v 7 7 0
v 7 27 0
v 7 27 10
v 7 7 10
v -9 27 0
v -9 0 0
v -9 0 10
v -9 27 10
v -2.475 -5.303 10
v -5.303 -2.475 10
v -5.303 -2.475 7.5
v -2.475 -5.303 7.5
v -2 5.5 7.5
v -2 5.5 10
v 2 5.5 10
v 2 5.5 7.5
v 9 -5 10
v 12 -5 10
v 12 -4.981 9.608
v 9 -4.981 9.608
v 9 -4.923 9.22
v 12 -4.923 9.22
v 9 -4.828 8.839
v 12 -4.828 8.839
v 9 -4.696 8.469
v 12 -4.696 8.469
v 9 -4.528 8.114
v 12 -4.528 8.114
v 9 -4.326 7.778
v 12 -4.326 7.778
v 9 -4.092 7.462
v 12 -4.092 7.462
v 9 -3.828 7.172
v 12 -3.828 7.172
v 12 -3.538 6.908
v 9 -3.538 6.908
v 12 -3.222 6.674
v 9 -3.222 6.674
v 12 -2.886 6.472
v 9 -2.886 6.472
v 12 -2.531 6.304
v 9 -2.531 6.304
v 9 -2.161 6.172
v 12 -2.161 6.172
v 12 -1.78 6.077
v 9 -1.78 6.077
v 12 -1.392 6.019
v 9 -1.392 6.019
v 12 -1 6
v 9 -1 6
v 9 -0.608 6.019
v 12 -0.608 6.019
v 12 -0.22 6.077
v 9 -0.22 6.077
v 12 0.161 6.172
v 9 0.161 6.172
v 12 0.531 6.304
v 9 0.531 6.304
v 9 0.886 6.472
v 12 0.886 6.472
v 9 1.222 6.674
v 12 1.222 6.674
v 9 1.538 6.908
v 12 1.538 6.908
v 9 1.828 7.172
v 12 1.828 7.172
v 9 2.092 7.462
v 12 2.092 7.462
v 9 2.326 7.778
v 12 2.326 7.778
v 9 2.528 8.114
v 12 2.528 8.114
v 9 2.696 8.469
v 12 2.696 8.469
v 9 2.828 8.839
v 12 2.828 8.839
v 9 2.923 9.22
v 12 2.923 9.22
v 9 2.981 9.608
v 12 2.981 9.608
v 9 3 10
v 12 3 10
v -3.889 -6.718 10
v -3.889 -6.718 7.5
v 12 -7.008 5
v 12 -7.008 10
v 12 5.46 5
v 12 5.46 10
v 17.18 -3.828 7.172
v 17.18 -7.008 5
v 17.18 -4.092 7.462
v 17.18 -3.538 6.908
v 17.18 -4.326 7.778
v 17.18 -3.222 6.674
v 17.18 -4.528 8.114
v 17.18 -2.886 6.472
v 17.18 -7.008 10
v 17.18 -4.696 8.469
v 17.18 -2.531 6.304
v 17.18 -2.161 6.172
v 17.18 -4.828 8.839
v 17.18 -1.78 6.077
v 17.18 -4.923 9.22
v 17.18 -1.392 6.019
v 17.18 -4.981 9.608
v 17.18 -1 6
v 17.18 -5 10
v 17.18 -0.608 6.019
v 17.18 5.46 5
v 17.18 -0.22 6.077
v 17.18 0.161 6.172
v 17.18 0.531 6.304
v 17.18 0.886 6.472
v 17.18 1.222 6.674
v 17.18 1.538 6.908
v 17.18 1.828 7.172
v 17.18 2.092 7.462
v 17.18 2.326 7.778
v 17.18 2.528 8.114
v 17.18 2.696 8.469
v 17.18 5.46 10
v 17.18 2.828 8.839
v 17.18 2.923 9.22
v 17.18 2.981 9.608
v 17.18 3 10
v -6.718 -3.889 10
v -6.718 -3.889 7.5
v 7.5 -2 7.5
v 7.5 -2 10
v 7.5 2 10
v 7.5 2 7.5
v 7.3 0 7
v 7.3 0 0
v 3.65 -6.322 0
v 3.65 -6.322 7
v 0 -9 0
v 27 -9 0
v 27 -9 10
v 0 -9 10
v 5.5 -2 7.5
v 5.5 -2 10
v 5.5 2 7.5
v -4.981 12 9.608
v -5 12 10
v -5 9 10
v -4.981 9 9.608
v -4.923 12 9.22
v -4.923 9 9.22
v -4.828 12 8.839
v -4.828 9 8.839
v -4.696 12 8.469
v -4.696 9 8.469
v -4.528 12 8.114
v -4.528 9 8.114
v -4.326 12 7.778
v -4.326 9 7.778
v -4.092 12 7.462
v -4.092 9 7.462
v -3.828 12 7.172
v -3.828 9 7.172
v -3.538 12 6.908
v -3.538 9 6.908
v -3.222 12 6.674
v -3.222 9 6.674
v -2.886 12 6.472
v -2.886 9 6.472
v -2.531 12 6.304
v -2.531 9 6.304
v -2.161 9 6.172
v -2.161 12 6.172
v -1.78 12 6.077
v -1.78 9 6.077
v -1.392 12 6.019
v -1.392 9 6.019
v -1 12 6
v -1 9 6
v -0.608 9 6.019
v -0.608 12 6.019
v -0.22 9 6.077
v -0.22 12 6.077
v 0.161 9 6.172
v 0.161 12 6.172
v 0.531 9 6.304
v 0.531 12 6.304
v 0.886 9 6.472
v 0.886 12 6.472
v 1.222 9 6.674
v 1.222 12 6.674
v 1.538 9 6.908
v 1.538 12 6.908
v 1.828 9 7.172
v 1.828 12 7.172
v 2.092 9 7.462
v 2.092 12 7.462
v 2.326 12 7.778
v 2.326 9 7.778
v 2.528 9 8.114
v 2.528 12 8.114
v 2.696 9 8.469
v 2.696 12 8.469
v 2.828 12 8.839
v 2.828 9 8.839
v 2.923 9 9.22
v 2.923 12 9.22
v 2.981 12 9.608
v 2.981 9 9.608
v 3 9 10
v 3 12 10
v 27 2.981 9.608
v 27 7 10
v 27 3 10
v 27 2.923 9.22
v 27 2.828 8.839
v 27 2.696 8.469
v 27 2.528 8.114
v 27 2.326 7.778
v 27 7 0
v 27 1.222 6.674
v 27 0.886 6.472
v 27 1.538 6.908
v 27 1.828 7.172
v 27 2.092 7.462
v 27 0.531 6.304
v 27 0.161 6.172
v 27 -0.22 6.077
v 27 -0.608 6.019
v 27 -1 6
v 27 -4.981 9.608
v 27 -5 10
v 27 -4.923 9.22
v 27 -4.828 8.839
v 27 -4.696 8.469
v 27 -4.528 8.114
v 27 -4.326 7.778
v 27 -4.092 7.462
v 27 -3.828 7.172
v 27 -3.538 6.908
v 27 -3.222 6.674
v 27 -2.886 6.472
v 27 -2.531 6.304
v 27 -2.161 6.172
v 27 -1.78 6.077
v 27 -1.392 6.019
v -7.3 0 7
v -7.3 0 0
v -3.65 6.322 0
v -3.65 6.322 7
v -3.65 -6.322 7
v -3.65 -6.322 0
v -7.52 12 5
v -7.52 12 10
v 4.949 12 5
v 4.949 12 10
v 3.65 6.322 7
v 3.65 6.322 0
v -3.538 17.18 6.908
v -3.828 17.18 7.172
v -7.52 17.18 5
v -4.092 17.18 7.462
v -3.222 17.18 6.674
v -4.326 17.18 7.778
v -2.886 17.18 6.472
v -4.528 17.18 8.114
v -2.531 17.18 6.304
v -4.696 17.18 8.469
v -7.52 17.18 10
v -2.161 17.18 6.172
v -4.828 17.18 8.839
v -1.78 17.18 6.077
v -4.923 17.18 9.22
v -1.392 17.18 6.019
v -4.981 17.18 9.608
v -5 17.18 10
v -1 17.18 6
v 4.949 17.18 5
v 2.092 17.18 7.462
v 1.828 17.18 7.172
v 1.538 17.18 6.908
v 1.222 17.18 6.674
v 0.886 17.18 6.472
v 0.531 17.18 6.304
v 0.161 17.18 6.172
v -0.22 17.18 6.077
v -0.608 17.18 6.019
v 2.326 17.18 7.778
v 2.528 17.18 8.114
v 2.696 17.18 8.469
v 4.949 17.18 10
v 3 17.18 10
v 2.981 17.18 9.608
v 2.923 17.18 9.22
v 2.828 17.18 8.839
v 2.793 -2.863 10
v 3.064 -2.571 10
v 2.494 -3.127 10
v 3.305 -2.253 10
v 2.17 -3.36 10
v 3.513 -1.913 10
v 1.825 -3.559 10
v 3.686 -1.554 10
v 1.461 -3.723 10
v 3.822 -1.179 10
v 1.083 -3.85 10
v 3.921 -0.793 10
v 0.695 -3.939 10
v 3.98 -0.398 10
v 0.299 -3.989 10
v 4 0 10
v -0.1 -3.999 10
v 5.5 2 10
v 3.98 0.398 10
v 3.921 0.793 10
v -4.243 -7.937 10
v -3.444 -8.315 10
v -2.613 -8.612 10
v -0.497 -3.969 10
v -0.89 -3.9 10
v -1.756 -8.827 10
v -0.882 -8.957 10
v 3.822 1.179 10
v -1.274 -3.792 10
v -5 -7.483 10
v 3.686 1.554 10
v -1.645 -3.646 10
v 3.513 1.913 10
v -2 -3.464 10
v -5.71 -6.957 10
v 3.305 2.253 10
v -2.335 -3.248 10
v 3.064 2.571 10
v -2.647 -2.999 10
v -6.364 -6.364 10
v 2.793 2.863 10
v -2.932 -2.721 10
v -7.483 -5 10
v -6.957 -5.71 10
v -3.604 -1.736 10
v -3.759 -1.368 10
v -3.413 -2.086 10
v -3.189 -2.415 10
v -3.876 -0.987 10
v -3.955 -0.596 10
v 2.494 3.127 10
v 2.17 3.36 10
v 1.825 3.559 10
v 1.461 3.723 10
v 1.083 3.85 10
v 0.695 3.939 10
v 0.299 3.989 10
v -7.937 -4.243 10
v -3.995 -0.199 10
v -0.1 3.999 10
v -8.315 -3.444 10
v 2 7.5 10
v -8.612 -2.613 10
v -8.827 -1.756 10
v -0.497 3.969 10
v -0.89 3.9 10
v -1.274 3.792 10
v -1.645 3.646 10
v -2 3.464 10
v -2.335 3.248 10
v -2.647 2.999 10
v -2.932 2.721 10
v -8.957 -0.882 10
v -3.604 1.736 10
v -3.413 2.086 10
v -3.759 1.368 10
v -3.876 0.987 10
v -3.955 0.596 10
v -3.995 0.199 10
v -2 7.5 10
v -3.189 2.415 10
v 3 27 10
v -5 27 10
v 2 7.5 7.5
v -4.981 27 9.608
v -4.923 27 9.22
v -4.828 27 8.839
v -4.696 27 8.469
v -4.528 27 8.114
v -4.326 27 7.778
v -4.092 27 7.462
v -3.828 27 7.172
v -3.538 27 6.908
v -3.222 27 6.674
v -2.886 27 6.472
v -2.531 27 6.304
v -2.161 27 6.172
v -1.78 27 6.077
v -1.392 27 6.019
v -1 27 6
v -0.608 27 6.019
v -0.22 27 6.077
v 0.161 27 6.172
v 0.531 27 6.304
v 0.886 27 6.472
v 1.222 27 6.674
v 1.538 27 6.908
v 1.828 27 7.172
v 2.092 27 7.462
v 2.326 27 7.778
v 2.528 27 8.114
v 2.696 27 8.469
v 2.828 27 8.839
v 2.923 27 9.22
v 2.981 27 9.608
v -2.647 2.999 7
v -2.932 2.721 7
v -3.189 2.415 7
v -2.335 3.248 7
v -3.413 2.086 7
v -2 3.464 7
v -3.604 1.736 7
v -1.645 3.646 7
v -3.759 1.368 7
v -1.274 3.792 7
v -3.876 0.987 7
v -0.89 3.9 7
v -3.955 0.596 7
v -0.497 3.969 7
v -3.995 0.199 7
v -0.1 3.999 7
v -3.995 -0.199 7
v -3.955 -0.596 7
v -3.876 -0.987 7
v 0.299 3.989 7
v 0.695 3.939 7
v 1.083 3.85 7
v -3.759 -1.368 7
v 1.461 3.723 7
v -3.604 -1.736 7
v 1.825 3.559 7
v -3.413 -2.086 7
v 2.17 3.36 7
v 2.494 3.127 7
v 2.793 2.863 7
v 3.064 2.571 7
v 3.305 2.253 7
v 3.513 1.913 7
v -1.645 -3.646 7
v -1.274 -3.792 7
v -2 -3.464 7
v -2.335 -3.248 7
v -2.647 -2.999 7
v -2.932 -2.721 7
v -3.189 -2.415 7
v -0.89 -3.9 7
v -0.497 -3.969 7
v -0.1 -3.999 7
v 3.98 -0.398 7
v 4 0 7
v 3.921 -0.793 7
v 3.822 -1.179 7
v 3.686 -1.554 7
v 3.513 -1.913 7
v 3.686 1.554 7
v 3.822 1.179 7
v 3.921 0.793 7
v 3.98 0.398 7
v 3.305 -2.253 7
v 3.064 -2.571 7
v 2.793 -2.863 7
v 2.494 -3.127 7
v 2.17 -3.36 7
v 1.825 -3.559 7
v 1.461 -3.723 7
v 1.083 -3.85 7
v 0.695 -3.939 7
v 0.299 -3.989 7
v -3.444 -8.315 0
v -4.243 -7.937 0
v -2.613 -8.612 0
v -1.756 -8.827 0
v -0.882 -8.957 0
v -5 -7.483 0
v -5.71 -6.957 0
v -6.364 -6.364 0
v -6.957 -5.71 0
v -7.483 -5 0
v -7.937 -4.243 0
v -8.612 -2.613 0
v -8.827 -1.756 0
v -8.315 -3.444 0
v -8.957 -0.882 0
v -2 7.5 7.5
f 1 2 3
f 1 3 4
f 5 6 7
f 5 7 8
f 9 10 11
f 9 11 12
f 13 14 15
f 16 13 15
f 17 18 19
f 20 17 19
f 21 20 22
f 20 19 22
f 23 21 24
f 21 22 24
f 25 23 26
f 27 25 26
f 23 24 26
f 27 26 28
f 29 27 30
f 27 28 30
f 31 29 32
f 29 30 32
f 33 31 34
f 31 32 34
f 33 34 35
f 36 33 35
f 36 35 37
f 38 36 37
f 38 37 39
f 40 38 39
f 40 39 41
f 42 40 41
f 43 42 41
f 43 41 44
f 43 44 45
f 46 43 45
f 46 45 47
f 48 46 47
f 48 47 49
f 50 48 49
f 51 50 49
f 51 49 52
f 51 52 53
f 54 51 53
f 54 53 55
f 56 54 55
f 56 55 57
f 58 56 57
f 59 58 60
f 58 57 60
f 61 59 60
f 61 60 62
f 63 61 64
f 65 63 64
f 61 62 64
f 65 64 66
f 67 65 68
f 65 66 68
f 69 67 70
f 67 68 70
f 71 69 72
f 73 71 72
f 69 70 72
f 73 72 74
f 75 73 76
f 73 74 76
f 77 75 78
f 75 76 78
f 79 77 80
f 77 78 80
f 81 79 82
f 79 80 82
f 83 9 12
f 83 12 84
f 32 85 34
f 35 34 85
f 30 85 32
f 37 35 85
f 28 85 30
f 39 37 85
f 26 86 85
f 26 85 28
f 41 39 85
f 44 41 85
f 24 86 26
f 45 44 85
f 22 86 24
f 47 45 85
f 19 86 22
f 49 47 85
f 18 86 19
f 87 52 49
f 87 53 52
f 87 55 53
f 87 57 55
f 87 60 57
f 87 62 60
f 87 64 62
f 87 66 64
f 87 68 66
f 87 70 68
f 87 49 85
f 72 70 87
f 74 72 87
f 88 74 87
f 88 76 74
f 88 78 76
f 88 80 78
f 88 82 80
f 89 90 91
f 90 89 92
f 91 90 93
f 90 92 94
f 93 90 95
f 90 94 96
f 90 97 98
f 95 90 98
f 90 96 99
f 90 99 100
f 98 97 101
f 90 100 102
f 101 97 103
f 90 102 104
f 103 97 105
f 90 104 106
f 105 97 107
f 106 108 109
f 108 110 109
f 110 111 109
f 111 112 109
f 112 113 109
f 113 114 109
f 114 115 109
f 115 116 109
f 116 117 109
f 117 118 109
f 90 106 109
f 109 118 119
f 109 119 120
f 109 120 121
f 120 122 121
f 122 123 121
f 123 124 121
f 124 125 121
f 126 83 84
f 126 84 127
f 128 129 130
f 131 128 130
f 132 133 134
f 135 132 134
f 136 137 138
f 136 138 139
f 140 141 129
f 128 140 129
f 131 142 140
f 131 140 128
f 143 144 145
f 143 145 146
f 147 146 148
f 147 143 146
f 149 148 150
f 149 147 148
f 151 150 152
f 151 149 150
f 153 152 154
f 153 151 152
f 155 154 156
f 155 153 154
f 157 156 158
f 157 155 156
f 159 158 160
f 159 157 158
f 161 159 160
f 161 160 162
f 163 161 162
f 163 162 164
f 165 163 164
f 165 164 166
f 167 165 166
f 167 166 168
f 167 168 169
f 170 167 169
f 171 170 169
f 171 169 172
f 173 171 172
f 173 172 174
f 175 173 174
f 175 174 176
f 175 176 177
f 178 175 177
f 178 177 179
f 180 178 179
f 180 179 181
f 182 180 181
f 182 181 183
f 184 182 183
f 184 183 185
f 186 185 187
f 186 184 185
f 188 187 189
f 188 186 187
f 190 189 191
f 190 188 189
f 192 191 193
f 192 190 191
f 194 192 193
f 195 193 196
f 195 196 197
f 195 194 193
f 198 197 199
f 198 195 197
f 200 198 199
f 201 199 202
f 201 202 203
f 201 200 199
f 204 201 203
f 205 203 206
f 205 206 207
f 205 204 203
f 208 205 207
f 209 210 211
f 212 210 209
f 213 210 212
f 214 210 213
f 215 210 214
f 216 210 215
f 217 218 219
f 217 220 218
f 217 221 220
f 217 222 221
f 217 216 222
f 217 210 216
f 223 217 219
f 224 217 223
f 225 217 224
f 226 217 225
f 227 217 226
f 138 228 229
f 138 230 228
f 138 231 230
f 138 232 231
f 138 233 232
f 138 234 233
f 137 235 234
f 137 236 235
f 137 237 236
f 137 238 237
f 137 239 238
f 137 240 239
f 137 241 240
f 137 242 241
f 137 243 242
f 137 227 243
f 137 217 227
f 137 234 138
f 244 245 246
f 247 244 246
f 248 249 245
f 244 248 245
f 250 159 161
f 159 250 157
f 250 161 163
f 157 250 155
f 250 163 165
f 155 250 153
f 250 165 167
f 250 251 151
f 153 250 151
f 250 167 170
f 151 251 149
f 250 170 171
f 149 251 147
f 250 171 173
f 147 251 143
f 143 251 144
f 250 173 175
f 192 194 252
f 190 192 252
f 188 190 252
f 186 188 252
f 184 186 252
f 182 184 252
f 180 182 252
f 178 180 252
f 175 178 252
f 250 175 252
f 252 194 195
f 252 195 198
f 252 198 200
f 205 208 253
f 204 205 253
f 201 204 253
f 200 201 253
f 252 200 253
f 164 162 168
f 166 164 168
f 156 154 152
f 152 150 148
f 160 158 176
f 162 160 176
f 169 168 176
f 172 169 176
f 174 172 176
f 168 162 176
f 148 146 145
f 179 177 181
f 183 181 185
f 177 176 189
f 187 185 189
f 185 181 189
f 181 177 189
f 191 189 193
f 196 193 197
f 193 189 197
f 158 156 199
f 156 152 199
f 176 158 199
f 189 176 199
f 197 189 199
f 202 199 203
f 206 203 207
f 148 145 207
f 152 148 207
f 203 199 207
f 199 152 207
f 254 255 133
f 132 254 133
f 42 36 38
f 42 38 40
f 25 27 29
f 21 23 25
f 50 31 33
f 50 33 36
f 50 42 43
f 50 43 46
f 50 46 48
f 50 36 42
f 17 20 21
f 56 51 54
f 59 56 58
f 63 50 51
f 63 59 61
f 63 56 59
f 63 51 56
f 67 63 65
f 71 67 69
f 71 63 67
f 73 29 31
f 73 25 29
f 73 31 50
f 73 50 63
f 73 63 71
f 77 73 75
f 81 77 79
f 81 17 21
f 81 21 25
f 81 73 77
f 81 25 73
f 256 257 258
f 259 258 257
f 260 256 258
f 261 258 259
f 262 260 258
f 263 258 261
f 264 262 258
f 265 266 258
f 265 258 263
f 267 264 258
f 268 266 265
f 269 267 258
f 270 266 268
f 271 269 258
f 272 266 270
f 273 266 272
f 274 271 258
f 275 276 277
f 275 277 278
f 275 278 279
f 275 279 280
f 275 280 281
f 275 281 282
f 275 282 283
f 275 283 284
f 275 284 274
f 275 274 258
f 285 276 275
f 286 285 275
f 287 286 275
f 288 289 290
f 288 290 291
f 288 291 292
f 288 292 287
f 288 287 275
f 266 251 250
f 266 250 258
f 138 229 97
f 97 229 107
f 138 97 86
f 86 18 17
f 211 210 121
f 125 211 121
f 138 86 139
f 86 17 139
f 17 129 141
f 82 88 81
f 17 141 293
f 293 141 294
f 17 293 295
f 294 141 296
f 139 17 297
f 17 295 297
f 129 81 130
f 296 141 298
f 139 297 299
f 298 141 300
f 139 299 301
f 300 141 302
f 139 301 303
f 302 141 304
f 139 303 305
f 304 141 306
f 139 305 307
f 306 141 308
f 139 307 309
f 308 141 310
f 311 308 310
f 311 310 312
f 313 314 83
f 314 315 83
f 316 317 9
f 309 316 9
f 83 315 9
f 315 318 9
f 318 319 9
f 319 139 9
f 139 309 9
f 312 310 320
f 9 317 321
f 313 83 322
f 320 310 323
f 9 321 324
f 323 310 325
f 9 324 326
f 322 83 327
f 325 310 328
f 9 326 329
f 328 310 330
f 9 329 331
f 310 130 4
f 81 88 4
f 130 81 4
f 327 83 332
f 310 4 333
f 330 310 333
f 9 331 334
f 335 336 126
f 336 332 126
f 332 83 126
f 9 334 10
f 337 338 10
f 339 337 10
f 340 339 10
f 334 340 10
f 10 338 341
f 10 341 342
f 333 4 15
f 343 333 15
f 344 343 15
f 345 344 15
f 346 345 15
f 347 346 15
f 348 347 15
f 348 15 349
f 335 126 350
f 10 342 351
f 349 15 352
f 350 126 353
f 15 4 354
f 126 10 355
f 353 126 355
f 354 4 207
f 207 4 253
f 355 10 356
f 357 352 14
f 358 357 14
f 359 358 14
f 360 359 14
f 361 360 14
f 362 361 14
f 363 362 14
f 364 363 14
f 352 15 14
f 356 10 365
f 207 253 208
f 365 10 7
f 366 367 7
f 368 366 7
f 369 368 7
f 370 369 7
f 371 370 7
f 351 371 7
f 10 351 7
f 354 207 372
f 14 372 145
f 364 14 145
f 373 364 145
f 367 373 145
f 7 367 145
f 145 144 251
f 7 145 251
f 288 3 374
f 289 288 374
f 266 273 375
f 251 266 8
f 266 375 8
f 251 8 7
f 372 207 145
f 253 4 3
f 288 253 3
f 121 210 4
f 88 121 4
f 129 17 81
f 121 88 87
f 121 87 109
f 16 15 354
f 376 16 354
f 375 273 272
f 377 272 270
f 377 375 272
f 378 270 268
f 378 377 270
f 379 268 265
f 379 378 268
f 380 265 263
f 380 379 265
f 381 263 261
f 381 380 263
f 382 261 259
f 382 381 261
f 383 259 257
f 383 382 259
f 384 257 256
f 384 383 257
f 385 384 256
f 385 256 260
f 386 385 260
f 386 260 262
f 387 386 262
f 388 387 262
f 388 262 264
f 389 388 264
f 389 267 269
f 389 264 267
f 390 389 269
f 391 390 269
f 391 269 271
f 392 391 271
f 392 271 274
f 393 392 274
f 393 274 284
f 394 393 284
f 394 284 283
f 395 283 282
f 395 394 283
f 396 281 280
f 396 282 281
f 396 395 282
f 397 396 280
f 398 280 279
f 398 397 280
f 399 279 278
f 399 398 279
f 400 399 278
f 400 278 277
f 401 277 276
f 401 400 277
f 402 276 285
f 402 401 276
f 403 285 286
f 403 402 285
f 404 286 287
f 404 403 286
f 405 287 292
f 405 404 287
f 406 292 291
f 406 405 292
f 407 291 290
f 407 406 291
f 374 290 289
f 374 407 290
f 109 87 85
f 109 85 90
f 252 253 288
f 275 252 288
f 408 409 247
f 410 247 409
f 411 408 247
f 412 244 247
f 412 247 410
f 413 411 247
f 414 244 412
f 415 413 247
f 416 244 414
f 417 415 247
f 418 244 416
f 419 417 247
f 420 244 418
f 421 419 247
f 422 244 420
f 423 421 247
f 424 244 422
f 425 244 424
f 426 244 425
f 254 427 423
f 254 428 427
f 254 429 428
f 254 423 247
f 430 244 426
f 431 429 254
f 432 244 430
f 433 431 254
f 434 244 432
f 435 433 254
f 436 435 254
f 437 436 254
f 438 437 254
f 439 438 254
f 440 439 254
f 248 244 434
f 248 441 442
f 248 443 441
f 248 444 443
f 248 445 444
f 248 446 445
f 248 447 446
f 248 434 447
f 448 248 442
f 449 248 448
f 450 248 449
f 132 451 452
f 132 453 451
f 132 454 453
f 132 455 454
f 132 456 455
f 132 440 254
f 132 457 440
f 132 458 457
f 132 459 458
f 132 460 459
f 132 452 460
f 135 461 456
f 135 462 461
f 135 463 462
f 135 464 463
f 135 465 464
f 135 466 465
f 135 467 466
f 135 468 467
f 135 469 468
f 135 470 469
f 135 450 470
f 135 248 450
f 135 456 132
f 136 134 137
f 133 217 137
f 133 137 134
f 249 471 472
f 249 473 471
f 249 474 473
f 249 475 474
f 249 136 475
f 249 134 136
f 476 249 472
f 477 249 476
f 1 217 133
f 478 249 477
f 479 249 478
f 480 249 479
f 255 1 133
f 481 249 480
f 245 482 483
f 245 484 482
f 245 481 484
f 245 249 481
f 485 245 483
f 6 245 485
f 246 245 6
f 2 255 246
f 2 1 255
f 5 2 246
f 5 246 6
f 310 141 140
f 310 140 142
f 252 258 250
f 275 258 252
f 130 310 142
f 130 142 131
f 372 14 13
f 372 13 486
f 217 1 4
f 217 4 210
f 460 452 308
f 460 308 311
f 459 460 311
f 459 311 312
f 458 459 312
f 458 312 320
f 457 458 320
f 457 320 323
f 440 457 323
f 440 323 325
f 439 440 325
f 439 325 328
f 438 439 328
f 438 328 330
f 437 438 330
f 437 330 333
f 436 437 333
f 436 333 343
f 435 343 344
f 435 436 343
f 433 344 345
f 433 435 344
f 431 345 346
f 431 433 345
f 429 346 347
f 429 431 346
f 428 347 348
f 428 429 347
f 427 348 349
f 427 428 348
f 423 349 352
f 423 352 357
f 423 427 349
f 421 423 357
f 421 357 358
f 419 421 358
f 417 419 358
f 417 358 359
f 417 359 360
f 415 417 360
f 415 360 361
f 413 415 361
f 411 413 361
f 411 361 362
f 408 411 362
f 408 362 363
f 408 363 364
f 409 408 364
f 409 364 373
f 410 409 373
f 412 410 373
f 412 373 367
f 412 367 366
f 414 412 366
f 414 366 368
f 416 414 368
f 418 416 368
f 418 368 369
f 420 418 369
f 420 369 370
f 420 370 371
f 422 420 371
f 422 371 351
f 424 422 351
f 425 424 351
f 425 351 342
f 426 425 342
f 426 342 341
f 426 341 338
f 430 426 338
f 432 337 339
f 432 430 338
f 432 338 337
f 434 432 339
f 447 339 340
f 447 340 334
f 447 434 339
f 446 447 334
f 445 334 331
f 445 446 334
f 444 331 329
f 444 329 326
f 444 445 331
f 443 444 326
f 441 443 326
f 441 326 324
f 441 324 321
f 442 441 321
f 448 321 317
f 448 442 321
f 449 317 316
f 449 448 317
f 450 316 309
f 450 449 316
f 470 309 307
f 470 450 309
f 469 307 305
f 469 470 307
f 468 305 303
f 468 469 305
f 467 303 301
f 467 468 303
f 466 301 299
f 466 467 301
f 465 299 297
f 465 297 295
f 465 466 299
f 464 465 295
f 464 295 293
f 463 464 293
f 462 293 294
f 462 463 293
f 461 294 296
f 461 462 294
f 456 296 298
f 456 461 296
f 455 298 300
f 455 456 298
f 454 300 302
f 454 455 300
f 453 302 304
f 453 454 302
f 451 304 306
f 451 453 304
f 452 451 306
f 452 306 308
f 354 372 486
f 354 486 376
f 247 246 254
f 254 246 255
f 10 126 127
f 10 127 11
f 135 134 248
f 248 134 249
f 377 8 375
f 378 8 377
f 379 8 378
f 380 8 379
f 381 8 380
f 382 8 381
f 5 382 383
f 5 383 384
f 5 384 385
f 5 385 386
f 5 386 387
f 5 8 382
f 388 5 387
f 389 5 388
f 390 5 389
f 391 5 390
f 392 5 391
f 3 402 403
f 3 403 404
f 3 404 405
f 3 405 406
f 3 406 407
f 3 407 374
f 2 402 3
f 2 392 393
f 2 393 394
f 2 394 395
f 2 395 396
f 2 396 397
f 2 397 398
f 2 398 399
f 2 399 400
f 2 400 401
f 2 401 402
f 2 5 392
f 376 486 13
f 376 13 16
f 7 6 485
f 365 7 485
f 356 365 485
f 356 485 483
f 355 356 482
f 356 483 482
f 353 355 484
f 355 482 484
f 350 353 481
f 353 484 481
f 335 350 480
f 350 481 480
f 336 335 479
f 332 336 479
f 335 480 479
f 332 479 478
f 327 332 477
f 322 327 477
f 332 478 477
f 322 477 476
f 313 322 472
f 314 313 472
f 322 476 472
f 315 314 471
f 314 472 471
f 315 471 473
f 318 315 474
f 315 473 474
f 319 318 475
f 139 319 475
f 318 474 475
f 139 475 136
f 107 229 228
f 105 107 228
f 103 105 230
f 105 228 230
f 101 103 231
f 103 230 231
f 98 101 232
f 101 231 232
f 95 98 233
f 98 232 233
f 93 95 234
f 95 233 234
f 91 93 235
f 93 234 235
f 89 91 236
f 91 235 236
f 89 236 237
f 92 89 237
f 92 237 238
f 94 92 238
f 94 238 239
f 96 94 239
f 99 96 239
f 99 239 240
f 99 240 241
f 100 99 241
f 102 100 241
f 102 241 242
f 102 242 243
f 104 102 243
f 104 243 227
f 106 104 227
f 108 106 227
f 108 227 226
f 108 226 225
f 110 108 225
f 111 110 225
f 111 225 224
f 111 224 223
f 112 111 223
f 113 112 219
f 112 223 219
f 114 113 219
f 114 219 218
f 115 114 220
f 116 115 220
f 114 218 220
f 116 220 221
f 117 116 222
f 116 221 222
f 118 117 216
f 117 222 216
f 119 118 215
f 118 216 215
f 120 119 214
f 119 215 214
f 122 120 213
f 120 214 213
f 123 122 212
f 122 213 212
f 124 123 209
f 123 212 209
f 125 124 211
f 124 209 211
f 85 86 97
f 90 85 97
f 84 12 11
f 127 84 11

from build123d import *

# Parameters (mm, degrees)
SKETCH003_W   = 12.468703
SKETCH003_H   = 5.180136
SKETCH003_W_2 = 5.180136
SKETCH003_H_2 = 12.468704
PAD003_DEPTH  = 5
SKETCH002_R   = 4
PAD002_DEPTH  = 18
SKETCH001_R   = 4
PAD001_DEPTH  = 18
PAD005_DEPTH  = 7
SKETCH004_W   = 4
SKETCH004_H   = 2
SKETCH004_W_2 = 2
SKETCH004_H_2 = 4
PAD004_DEPTH  = 2.5
SKETCH_R      = 4
PAD_DEPTH     = 10


with BuildPart() as nutmount:
    # Sketch003 → Pad003 (new body)
    with BuildSketch(Plane.XY.offset(10)):
        with Locations((-1.285158, 14.590068)):
            Rectangle(SKETCH003_W, SKETCH003_H)
        with Locations((14.590068, -0.774081)):
            Rectangle(SKETCH003_W_2, SKETCH003_H_2)
    extrude(amount=-PAD003_DEPTH)


with BuildPart() as mount002:
    # Sketch002 → Pad002 (new body)
    with BuildSketch(Plane.XZ.offset(-27)):
        with Locations((-1, 10)):
            Circle(SKETCH002_R)
    extrude(amount=PAD002_DEPTH)


with BuildPart() as mount001:
    # Sketch001 → Pad001 (new body)
    with BuildSketch(Plane.YZ.offset(27)):
        with Locations((-1, 10)):
            Circle(SKETCH001_R)
    extrude(amount=-PAD001_DEPTH)


with BuildPart() as nutflush:
    # Sketch005 → Pad005 (new body)
    with BuildSketch(Plane(origin=(0, 0, 0), x_dir=(1, 0, 0), z_dir=(0, 0, -1))):
        Polygon((3.65, -6.321985), (7.3, 0), (3.65, 6.321985), (-3.65, 6.321985), (-7.3, 0), (-3.65, -6.321985), align=None)
    extrude(amount=-PAD005_DEPTH)


with BuildPart() as cutblock:
    # Sketch004 → Pad004 (new body)
    with BuildSketch(Plane.XY.offset(10)):
        with Locations((0, 6.5)):
            Rectangle(SKETCH004_W, SKETCH004_H)
        with Locations((6.5, 0)):
            Rectangle(SKETCH004_W_2, SKETCH004_H_2)
        Polygon((-6.717514, -3.889087), (-5.303301, -2.474874), (-2.474874, -5.303301), (-3.889087, -6.717514), align=None)
    extrude(amount=-PAD004_DEPTH)

    # Fusion: union NutMount, Mount002, Mount001, NutFlush
    add(nutmount.part)
    add(mount002.part)
    add(mount001.part)
    add(nutflush.part)


with BuildPart() as cut:
    # Sketch → Pad (new body)
    with BuildSketch(Plane.XY):
        with BuildLine():
            Line((-9, 3.6e-05), (-9, 27))
            Line((-9, 27), (7, 27))
            Line((7, 27), (7, 7))
            Line((7, 7), (27, 7))
            Line((27, 7), (27, -9))
            Line((27, -9), (3.6e-05, -9))
            ThreePointArc((-9, 3.6e-05), (-6.363961, -6.363961), (3.6e-05, -9))
        make_face()
        Circle(SKETCH_R, mode=Mode.SUBTRACT)
    extrude(amount=PAD_DEPTH)

    # Cut: cut CutBlock
    add(cutblock.part, mode=Mode.SUBTRACT)


solid = cut.part
